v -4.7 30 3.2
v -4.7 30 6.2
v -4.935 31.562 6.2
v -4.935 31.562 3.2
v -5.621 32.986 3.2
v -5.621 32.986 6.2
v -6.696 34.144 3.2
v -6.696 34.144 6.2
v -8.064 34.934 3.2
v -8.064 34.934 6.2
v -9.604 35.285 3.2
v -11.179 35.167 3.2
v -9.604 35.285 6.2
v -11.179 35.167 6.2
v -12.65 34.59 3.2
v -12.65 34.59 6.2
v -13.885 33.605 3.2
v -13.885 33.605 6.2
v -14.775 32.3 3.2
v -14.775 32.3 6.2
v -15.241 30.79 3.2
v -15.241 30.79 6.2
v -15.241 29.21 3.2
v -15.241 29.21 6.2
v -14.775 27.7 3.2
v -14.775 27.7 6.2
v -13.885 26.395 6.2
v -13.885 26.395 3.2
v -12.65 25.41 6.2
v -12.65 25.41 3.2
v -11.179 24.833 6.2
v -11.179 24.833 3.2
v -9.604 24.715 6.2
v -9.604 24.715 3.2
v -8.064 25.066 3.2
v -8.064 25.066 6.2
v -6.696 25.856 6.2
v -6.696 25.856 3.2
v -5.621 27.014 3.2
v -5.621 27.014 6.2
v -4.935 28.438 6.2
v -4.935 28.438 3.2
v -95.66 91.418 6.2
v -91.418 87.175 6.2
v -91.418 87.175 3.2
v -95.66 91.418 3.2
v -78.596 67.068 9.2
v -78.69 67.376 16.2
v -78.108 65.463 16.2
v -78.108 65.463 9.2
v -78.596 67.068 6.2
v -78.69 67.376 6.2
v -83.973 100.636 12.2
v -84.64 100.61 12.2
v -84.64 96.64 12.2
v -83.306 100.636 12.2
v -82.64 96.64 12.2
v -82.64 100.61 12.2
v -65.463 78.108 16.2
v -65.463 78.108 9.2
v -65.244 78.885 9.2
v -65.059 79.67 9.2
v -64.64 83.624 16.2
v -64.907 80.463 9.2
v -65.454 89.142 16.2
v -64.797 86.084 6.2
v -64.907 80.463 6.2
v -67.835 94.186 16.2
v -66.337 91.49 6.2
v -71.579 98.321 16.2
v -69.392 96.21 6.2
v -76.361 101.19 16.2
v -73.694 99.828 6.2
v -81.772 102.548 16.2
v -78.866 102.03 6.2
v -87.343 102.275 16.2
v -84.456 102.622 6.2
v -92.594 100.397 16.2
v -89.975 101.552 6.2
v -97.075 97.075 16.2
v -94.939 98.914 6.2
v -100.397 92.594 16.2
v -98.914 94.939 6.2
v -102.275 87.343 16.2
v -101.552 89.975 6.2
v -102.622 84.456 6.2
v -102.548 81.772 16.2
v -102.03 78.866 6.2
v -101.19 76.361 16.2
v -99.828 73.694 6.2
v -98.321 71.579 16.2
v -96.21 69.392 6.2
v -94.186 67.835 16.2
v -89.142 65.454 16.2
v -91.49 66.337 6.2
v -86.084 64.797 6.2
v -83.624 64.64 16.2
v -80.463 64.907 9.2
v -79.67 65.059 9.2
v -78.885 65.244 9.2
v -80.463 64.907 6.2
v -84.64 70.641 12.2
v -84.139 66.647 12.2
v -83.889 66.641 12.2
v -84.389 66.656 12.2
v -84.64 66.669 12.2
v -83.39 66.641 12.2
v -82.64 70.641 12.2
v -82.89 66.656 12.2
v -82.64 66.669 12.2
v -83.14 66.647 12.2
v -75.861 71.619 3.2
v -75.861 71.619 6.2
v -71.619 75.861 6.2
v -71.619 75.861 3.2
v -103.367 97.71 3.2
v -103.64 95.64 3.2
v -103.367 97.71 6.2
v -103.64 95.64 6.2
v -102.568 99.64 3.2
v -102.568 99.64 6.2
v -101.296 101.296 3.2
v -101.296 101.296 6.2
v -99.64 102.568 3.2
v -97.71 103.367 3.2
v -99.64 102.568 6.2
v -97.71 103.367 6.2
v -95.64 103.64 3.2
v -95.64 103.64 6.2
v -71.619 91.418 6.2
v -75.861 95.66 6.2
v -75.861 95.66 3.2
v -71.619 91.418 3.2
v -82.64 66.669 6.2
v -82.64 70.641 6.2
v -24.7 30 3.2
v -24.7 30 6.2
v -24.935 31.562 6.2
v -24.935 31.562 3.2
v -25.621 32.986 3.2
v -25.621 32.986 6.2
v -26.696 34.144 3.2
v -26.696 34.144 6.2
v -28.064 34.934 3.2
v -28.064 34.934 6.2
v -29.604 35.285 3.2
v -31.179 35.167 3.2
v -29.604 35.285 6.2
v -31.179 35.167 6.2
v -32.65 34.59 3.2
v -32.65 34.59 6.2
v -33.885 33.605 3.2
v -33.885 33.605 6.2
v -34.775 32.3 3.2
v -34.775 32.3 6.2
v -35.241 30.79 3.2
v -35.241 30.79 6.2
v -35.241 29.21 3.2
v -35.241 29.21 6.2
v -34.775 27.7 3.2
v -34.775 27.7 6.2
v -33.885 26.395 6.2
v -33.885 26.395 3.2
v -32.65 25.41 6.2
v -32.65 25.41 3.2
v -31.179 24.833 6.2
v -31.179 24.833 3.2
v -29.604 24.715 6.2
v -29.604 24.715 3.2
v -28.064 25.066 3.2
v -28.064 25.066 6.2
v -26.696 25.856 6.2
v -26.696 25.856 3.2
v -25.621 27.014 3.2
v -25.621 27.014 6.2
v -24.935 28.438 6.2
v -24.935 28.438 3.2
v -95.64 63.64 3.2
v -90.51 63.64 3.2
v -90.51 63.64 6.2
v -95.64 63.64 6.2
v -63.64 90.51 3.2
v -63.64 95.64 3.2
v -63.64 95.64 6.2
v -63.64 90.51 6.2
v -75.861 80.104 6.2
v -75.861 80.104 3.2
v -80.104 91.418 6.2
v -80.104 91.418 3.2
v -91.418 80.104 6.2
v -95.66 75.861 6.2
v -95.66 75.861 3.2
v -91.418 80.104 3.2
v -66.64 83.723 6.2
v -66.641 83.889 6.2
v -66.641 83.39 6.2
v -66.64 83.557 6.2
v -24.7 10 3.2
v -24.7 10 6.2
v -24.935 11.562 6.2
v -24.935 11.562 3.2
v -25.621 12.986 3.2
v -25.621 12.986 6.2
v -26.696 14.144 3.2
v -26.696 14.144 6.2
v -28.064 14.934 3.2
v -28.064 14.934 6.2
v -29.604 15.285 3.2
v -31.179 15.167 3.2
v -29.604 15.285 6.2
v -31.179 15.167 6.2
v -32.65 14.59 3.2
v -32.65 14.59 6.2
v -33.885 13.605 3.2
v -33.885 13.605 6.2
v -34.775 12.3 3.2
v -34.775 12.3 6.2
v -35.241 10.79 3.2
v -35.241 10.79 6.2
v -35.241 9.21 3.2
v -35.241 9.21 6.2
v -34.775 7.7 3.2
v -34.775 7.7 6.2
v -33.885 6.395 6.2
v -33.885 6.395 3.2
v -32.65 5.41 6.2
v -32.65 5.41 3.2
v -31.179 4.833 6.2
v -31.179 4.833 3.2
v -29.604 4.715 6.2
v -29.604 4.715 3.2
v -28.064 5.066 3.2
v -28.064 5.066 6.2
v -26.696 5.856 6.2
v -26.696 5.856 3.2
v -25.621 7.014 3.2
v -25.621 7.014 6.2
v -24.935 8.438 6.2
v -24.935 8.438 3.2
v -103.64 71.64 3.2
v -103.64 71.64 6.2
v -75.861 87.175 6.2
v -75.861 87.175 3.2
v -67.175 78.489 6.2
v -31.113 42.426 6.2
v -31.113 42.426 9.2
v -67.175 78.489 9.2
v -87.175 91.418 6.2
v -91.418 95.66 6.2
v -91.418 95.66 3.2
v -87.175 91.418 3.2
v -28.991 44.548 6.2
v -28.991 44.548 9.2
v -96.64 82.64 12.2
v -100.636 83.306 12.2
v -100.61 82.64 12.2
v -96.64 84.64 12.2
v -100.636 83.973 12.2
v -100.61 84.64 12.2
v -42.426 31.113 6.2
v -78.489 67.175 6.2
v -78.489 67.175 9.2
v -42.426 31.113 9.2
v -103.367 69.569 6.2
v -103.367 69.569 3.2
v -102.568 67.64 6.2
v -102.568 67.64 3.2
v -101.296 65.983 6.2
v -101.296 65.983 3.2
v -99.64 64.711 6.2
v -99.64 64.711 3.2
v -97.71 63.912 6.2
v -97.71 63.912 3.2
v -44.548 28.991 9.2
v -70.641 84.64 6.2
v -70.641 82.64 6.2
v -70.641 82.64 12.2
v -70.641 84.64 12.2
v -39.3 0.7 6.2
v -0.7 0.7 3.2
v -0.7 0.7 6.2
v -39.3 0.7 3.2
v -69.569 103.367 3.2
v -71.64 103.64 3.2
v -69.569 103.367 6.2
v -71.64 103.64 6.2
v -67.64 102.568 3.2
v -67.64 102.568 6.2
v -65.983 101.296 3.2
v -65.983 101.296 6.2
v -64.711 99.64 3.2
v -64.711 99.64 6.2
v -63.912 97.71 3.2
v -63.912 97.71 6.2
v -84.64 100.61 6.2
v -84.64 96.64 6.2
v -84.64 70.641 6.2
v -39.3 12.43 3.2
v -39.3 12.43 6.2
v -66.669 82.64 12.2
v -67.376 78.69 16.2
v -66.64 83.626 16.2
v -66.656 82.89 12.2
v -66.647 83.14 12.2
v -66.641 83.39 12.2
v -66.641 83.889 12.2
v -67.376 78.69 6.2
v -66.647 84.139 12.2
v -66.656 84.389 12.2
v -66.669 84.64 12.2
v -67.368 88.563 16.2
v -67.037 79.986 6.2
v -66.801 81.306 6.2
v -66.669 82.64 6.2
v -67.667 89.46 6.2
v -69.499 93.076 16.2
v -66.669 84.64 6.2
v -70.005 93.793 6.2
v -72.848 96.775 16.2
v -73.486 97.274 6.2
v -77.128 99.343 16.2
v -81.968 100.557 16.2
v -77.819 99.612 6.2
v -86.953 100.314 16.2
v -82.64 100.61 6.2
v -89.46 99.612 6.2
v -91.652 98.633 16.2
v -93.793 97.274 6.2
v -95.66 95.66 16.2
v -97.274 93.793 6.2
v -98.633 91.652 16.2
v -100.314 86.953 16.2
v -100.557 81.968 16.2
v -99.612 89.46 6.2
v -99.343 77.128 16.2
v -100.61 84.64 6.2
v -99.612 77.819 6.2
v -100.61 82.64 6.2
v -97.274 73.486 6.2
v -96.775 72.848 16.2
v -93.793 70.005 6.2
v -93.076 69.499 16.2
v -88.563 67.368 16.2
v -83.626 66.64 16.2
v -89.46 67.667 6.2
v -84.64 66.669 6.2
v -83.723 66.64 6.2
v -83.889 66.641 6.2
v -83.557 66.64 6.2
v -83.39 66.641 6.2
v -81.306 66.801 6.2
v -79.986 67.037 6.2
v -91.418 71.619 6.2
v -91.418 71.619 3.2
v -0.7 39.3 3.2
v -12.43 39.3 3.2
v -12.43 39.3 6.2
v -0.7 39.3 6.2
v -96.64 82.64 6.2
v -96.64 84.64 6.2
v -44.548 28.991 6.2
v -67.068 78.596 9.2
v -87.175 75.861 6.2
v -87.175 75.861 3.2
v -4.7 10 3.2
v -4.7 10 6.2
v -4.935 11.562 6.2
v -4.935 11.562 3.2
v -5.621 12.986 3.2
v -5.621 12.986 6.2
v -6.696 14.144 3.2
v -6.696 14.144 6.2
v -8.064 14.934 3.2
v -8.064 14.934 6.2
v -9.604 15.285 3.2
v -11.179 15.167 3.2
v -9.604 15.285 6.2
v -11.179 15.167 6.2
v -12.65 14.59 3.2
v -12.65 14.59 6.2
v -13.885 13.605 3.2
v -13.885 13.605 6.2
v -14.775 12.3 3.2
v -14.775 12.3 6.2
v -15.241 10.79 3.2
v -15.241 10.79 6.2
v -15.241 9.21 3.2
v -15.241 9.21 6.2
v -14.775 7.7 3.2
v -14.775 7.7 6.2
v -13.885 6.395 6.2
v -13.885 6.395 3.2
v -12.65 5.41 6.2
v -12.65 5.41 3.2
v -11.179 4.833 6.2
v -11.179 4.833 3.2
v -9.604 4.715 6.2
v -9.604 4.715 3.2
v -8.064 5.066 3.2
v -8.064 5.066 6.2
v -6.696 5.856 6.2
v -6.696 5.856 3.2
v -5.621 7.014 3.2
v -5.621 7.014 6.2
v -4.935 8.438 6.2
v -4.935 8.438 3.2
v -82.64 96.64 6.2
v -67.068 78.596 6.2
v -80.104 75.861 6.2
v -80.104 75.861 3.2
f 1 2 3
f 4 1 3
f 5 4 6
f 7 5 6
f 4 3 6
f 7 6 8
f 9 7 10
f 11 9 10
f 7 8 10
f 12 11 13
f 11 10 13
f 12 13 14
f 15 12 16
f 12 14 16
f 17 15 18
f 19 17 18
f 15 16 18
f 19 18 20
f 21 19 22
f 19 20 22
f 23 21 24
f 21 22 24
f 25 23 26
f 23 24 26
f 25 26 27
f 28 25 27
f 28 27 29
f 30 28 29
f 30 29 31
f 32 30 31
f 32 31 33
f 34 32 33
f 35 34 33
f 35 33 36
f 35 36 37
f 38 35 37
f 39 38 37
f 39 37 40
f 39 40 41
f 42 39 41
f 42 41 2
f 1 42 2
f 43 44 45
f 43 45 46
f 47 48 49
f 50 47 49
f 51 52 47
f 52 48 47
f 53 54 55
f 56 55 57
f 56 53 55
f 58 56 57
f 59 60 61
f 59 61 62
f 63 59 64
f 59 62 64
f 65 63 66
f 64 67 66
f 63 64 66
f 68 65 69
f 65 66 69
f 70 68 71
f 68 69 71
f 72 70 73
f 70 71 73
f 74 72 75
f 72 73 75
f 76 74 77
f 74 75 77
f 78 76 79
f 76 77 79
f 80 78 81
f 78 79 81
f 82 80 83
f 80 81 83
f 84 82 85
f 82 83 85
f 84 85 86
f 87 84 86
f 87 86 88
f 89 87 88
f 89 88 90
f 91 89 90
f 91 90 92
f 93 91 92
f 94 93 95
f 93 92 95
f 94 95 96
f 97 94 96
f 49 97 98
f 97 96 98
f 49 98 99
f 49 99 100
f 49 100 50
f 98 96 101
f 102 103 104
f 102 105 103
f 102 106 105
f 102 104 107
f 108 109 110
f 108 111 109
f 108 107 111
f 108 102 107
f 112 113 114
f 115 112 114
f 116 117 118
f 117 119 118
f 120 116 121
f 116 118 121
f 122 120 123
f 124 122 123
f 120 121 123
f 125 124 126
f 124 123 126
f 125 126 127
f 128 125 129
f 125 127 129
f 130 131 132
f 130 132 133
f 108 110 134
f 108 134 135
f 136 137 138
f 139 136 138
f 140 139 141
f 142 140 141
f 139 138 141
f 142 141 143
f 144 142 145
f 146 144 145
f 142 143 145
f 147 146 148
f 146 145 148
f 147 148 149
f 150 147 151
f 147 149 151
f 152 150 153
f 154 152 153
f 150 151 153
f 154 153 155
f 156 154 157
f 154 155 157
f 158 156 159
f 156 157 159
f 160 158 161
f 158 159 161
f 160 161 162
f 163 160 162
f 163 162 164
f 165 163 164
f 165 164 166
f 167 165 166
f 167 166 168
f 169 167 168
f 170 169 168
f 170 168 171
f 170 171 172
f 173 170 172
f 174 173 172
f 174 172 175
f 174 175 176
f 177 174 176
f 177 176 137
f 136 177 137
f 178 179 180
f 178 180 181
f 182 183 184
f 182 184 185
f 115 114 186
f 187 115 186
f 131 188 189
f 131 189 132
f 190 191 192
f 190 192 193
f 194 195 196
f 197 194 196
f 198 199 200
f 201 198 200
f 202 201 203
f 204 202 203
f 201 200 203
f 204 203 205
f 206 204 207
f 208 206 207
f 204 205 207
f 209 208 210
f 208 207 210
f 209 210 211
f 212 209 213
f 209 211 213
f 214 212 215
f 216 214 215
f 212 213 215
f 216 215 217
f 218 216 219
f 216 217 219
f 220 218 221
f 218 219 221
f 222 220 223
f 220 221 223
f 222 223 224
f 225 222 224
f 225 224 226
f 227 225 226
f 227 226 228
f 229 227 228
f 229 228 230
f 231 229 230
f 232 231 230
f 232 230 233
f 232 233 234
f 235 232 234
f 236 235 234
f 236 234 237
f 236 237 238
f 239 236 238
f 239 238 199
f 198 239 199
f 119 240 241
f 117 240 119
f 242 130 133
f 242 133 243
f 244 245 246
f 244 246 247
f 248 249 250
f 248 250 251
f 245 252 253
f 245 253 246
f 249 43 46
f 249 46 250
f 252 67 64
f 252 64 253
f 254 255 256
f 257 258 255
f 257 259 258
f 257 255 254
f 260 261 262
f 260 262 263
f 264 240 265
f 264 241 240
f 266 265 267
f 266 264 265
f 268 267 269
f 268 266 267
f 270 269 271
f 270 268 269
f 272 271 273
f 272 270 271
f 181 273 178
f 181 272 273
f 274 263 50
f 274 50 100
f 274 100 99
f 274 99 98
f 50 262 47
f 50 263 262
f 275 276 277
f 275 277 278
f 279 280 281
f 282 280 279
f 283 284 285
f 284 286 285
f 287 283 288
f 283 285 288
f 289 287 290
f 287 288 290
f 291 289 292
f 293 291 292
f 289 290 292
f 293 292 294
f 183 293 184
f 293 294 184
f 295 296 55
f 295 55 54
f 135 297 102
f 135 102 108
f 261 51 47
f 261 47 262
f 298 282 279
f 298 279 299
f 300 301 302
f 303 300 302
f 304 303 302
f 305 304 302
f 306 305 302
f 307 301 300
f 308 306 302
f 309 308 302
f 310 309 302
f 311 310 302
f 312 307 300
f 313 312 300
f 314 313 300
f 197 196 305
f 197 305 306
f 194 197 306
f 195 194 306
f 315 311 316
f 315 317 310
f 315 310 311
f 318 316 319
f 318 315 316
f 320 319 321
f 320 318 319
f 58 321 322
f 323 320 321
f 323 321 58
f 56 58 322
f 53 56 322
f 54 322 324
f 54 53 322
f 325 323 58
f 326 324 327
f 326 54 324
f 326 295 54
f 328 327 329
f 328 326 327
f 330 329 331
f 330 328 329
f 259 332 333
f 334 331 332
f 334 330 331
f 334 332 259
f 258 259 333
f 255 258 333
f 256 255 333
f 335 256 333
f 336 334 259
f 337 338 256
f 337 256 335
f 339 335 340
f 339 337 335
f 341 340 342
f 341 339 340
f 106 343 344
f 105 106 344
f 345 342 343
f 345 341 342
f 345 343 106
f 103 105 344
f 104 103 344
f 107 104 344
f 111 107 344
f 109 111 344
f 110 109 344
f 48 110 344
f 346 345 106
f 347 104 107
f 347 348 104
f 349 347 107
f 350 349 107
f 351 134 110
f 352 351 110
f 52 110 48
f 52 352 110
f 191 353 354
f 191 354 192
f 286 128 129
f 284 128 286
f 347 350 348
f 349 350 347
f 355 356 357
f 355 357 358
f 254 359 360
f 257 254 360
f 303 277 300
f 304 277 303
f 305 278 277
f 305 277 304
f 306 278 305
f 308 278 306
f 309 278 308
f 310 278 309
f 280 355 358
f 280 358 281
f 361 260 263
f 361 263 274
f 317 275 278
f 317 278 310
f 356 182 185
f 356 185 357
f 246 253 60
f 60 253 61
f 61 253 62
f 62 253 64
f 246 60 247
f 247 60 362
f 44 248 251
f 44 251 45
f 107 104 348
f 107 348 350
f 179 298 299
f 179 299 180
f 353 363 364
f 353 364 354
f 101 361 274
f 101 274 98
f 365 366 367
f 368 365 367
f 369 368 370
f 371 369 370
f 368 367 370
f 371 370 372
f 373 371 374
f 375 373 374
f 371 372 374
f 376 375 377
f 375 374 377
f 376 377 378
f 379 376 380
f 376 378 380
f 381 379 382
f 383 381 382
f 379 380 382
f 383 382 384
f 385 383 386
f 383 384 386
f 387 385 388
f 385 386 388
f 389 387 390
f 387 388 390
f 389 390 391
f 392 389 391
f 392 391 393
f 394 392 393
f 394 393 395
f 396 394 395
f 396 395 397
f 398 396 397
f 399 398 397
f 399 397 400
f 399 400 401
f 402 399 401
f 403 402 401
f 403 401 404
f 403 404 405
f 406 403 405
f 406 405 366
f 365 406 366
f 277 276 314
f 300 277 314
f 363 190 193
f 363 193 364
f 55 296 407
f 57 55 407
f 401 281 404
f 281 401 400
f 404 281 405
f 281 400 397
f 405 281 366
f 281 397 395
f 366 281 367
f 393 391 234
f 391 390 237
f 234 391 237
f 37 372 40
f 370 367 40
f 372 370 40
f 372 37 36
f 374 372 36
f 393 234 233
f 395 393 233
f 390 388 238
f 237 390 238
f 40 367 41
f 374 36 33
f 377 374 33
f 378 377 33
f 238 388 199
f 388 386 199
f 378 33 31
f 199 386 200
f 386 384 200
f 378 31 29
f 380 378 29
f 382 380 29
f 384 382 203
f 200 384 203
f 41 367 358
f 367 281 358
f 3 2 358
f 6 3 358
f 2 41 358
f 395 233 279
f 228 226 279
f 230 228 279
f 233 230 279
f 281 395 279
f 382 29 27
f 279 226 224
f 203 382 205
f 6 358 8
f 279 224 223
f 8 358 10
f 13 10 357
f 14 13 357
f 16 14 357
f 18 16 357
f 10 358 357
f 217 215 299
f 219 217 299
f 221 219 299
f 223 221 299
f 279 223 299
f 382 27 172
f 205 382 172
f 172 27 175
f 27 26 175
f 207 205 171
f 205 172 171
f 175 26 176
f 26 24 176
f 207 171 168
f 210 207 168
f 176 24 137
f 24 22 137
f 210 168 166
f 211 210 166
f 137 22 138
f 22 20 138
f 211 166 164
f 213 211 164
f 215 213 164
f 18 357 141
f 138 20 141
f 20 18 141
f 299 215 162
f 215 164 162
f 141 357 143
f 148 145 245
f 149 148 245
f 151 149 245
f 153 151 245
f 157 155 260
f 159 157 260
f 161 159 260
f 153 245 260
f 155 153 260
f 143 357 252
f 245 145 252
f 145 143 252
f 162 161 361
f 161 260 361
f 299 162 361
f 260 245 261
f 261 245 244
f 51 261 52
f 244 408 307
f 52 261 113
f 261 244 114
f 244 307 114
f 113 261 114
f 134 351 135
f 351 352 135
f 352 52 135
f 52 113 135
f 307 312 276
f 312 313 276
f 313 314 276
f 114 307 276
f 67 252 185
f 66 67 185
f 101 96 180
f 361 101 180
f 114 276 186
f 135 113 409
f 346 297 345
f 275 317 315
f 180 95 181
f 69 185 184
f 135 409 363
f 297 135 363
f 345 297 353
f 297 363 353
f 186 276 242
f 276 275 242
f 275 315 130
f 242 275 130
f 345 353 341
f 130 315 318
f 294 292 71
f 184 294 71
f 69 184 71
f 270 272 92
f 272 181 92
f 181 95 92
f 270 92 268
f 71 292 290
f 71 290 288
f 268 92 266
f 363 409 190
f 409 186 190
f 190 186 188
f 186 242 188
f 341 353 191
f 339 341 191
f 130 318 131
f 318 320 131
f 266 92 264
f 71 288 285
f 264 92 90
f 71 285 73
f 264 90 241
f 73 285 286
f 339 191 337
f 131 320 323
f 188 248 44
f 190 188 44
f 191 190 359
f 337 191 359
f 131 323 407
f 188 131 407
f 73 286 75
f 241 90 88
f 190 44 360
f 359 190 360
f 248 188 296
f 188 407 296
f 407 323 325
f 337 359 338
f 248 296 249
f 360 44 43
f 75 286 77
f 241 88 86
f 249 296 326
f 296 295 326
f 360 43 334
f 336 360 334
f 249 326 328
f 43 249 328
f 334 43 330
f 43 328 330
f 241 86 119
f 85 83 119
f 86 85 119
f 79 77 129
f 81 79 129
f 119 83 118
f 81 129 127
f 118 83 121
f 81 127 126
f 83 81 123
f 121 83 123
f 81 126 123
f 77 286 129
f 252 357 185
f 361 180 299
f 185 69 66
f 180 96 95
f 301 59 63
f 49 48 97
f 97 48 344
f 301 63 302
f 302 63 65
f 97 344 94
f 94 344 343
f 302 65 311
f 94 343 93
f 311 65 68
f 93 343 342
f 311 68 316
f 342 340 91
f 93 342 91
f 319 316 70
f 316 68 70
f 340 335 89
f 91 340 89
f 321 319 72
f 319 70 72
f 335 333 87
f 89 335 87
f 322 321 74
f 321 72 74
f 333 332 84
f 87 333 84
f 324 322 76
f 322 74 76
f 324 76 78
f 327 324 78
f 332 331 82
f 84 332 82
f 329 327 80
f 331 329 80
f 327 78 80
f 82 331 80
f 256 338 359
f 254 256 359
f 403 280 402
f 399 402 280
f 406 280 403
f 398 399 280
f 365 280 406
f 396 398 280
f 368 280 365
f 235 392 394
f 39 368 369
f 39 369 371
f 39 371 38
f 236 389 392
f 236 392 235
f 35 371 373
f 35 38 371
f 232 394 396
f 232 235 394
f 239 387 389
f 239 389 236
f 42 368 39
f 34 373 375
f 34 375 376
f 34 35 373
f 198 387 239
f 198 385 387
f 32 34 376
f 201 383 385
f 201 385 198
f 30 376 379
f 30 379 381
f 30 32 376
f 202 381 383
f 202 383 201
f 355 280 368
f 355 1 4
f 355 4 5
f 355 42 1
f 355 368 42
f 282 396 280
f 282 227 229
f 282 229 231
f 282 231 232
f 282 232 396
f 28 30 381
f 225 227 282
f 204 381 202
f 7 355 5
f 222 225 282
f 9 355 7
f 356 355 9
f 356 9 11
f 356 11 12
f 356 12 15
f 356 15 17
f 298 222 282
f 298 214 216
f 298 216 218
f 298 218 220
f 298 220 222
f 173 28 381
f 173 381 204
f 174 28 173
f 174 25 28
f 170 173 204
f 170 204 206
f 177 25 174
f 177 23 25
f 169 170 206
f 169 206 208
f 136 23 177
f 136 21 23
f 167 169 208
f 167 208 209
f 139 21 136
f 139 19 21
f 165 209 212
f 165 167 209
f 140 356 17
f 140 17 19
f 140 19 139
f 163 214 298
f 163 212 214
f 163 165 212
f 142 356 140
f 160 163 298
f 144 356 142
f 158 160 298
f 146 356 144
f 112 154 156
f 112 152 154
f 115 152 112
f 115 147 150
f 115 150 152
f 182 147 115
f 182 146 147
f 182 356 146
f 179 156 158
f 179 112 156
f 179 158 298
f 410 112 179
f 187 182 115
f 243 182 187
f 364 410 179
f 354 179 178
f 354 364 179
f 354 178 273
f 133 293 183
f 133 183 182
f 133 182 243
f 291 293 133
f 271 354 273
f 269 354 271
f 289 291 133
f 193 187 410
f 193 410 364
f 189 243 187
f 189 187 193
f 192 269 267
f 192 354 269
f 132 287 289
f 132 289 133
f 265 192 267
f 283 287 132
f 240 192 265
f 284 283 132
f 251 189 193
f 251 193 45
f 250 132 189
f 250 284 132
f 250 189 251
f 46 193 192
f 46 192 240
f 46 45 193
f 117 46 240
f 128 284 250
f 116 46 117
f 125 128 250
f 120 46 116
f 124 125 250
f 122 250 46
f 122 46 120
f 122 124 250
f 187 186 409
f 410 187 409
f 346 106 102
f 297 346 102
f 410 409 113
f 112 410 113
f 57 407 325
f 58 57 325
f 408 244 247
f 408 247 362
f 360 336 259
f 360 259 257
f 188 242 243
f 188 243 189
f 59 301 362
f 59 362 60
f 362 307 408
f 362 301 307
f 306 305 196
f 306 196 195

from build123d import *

# Parameters (mm, degrees)
PAD002_DEPTH    = 3
POCKET001_DEPTH = 5
PAD003_DEPTH    = 10
FILLET_R        = 8
FILLET001_R     = 8
FILLET002_R     = 8
PAD004_DEPTH    = 3
SKETCH007_W     = 2
SKETCH007_H     = 4
SKETCH007_W_2   = 4
SKETCH007_H_2   = 2
PAD005_DEPTH    = 6
SKETCH008_R     = 5.3
POCKET002_DEPTH = 5


with BuildPart() as part:
    # Sketch003 → Pad002 (new body)
    with BuildSketch(Plane.XY.offset(3.2)):
        Polygon((-63.6396103068, 90.5096679919), (-12.4299423149, 39.3), (-0.7, 39.3), (-0.7, 0.7), (-39.3, 0.7), (-39.3, 12.4299423149), (-90.5096679919, 63.6396103068), (-103.6396103068, 63.6396103068), (-103.6396103068, 103.6396103068), (-63.6396103068, 103.6396103068), align=None)
    extrude(amount=PAD002_DEPTH)

    # Sketch004 (on Face12 of Pad002) → Pocket001 (cut)
    with BuildSketch(Plane.XY.offset(6.2)):
        Polygon((-95.660425587, 75.8614357137), (-91.4177848998, 80.1040764009), (-87.1751442127, 75.8614357137), (-91.4177848998, 71.6187950266), align=None)
        Polygon((-75.8614357137, 87.1751442127), (-80.1040764009, 91.4177848998), (-75.8614357137, 95.660425587), (-71.6187950266, 91.4177848998), align=None)
        Polygon((-87.1751442127, 91.4177848998), (-91.4177848998, 87.1751442127), (-95.660425587, 91.4177848998), (-91.4177848998, 95.660425587), align=None)
        Polygon((-75.8614357137, 80.1040764009), (-80.1040764009, 75.8614357137), (-75.8614357137, 71.6187950266), (-71.6187950266, 75.8614357137), align=None)
    extrude(amount=-POCKET001_DEPTH, mode=Mode.SUBTRACT)

    # Sketch005 (on Face5 of Pocket001) → Pad003 (join)
    with BuildSketch(Plane.XY.offset(6.2)):
        with BuildLine():
            ThreePointArc((-67.3761543395, 78.6898628385), (-95.660425587, 95.660425587), (-78.6898628385, 67.3761543395))
            Line((-78.6898628385, 67.3761543395), (-78.1075396069, 65.4628065786))
            ThreePointArc((-65.4628065786, 78.1075396069), (-97.0746391493, 97.0746391493), (-78.1075396069, 65.4628065786))
            Line((-67.3761543395, 78.6898628385), (-65.4628065786, 78.1075396069))
        make_face()
    extrude(amount=PAD003_DEPTH)

    # Fillet
    fillet_edges = [part.edges().sort_by_distance(p)[0] for p in [
        (-103.63961, 63.63961, 4.7),
    ]]
    fillet(fillet_edges, radius=FILLET_R)

    # Fillet001
    fillet001_edges = [part.edges().sort_by_distance(p)[0] for p in [
        (-103.63961, 103.63961, 4.7),
    ]]
    fillet(fillet001_edges, radius=FILLET001_R)

    # Fillet002
    fillet002_edges = [part.edges().sort_by_distance(p)[0] for p in [
        (-63.63961, 103.63961, 4.7),
    ]]
    fillet(fillet002_edges, radius=FILLET002_R)

    # Sketch006 (on Face31 of Fillet002) → Pad004 (join)
    with BuildSketch(Plane.XY.offset(6.2)):
        Polygon((-80.6101730553, 65.0538238692), (-78.4888527117, 67.1751442127), (-42.4264068712, 31.1126983722), (-44.5477272148, 28.9913780286), align=None)
        Polygon((-67.1751442128, 78.4888527117), (-65.0538238692, 80.6101730553), (-28.9913780286, 44.5477272148), (-31.1126983722, 42.4264068711), align=None)
    extrude(amount=PAD004_DEPTH)

    # Sketch007 (on Face31 of Pad004) → Pad005 (join)
    with BuildSketch(Plane.XY.offset(6.2)):
        with Locations((-83.6396103068, 98.6396103068)):
            Rectangle(SKETCH007_W, SKETCH007_H)
        with Locations((-98.6396103068, 83.6396103068)):
            Rectangle(SKETCH007_W_2, SKETCH007_H_2)
        with Locations((-68.6414357137, 83.6396103068)):
            Rectangle(SKETCH007_W_2, SKETCH007_H_2)
        with Locations((-83.6396103068, 68.6414357137)):
            Rectangle(SKETCH007_W, SKETCH007_H)
    extrude(amount=PAD005_DEPTH)

    # Sketch008 (on Face31 of Pad005) → Pocket002 (cut)
    with BuildSketch(Plane.XY.offset(6.2)):
        with Locations((-30, 30)):
            Circle(SKETCH008_R)
        with Locations((-10, 30)):
            Circle(SKETCH008_R)
        with Locations((-30, 10)):
            Circle(SKETCH008_R)
        with Locations((-10, 10)):
            Circle(SKETCH008_R)
    extrude(amount=-POCKET002_DEPTH, mode=Mode.SUBTRACT)


solid = part.part
